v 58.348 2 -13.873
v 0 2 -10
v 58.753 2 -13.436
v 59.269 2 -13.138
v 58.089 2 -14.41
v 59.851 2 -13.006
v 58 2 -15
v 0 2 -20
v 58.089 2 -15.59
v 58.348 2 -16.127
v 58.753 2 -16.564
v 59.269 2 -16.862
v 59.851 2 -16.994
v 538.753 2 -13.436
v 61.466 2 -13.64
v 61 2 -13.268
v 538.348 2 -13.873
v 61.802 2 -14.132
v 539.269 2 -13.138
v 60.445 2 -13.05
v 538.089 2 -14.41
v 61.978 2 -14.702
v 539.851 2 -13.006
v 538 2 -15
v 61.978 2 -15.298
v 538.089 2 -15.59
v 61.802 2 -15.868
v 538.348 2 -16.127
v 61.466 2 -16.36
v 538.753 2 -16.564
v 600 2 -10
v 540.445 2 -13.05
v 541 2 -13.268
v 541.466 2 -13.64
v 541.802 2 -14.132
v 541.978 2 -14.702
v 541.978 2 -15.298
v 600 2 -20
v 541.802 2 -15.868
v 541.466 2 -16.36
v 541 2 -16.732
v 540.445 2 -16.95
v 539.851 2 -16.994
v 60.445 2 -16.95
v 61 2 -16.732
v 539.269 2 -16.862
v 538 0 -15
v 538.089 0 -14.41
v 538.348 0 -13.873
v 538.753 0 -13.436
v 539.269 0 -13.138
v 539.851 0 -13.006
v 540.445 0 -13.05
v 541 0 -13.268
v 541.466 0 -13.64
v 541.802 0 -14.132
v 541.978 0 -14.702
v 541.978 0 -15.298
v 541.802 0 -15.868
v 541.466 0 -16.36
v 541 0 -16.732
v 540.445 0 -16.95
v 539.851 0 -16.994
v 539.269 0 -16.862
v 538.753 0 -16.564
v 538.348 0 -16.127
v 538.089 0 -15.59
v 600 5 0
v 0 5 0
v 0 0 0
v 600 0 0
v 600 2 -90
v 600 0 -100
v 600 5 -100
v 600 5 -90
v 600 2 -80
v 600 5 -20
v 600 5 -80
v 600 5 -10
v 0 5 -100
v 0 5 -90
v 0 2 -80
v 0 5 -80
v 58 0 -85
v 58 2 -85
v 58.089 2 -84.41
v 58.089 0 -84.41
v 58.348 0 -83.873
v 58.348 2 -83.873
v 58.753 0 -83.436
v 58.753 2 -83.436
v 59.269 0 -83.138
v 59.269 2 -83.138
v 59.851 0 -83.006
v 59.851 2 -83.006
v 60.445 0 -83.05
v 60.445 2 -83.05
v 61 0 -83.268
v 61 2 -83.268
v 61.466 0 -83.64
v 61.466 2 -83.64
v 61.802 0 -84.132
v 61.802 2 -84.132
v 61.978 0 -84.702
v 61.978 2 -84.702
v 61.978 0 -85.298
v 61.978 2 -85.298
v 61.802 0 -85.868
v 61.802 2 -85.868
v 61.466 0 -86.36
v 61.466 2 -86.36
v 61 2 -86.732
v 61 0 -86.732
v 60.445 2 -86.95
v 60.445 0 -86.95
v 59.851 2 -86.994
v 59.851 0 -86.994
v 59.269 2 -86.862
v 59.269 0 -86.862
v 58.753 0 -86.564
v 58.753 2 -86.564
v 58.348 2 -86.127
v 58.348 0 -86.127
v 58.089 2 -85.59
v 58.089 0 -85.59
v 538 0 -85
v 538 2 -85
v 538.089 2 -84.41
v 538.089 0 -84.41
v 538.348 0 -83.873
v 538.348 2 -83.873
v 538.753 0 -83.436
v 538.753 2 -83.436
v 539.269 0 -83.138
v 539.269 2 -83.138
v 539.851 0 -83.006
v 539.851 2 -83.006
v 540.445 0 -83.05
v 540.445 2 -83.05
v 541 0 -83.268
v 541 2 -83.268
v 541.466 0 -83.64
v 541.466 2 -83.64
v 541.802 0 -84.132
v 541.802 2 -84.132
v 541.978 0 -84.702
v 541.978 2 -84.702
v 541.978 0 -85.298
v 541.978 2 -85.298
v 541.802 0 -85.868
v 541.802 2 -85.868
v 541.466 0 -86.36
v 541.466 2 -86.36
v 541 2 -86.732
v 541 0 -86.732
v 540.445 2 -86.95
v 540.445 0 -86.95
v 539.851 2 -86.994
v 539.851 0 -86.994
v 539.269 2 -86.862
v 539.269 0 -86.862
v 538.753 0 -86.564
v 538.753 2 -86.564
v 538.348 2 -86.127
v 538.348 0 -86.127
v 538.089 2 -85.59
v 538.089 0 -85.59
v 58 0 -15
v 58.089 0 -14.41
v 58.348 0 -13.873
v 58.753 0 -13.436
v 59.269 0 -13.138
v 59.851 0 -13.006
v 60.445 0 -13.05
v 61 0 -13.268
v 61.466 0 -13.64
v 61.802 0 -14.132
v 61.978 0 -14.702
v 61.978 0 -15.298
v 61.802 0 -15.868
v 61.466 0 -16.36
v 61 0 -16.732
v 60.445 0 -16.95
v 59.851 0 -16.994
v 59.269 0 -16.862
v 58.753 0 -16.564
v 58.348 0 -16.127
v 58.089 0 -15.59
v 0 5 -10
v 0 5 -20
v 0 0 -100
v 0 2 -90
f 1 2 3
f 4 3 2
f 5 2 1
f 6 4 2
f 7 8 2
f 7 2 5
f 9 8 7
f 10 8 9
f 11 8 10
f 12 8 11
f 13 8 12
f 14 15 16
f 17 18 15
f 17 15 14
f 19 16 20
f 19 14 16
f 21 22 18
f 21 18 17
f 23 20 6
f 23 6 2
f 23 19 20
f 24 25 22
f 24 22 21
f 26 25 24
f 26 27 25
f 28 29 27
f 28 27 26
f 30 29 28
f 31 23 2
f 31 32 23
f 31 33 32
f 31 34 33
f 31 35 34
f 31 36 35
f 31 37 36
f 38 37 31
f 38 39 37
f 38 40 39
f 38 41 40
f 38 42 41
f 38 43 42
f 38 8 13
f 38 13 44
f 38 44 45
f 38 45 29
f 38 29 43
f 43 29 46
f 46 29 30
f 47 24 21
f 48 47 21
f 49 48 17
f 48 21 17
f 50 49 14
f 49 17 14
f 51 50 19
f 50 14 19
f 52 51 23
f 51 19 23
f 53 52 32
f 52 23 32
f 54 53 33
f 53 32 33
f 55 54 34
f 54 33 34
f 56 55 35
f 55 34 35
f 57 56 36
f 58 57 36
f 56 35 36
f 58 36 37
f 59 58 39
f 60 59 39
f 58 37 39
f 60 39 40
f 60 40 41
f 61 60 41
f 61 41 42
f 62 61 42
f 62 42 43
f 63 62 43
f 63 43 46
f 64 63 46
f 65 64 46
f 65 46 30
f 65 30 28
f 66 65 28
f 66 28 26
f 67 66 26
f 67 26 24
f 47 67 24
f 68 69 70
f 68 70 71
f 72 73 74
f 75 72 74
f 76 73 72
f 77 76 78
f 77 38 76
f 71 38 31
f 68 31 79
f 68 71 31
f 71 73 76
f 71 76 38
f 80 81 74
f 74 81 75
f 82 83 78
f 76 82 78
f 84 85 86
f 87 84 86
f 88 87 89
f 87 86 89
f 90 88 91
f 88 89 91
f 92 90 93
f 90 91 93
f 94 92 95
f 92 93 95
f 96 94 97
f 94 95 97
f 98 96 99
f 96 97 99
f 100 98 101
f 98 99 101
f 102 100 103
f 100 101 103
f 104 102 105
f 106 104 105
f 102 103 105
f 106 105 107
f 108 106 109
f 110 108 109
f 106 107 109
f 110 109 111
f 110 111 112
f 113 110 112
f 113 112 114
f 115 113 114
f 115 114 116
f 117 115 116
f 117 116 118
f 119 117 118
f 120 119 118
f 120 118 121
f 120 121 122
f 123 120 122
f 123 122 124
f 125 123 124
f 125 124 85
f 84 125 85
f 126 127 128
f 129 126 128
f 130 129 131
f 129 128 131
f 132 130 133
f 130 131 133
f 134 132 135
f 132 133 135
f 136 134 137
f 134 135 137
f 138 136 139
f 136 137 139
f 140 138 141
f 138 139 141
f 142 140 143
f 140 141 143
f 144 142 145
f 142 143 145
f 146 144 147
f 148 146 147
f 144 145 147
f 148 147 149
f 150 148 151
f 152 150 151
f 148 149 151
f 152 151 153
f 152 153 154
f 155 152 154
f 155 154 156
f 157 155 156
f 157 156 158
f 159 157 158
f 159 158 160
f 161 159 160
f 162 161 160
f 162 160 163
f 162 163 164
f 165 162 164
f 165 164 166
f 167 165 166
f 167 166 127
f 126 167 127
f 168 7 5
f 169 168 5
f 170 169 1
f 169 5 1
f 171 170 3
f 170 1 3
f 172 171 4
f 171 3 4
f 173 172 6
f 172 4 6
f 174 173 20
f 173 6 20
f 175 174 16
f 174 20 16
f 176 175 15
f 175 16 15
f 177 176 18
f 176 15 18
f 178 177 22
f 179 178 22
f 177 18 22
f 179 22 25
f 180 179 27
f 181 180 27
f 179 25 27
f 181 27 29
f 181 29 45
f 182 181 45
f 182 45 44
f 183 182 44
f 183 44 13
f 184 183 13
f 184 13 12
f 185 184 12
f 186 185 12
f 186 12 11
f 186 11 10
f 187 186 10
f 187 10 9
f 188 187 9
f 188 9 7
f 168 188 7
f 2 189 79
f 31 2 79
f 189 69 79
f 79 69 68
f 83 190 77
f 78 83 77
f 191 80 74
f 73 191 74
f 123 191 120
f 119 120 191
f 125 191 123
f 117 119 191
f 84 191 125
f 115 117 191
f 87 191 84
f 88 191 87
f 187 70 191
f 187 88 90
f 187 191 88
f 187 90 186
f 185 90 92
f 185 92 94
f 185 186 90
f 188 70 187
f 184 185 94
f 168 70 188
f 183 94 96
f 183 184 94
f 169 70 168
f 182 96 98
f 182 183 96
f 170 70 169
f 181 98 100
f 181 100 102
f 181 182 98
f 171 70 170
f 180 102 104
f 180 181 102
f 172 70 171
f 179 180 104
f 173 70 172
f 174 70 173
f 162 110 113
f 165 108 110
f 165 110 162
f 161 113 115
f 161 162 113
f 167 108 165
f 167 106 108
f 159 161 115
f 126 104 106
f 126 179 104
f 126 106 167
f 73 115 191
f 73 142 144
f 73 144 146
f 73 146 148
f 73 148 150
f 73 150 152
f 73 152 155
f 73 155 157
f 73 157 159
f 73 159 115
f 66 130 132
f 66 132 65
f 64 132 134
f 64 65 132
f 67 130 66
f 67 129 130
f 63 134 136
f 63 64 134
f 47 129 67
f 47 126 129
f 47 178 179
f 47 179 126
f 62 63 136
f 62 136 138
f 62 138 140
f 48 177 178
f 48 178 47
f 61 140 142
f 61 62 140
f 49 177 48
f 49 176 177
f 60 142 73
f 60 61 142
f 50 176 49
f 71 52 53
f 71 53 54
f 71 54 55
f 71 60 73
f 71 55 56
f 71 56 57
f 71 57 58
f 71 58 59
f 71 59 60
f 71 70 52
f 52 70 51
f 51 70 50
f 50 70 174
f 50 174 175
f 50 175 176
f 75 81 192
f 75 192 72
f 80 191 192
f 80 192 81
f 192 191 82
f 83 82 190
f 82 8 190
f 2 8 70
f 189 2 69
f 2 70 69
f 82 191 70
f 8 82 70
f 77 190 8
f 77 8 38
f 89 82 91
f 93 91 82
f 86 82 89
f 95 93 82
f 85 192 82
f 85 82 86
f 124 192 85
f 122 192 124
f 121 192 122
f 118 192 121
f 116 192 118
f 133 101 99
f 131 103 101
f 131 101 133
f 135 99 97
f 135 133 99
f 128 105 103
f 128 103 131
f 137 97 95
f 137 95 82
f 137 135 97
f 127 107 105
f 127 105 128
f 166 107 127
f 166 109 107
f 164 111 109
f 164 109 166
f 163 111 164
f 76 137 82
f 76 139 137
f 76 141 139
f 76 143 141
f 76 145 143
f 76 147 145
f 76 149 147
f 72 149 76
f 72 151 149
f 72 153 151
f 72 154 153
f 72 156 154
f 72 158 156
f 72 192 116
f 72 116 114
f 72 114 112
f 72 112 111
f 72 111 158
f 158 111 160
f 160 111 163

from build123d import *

# Parameters (mm, degrees)
SKETCH1_W           = 600
SKETCH1_H           = 5
BOSS_EXTRUDE1_DEPTH = 100
SKETCH5_W           = 600
SKETCH5_H           = 10
CUT_EXTRUDE1_DEPTH  = 3
SKETCH6_R           = 2
CUT_EXTRUDE2_DEPTH  = 609.296802556


with BuildPart() as part:
    # Sketch1 → Boss-Extrude1 (new body)
    with BuildSketch(Plane.XY):
        with Locations((300, 2.5)):
            Rectangle(SKETCH1_W, SKETCH1_H)
    extrude(amount=-BOSS_EXTRUDE1_DEPTH)

    # Sketch5 → Cut-Extrude1 (cut)
    with BuildSketch(Plane(origin=(0, 5, 0), x_dir=(1, 0, 0), z_dir=(0, 1, 0))):
        with Locations((300, 85)):
            Rectangle(SKETCH5_W, SKETCH5_H)
        with Locations((300, 15)):
            Rectangle(SKETCH5_W, SKETCH5_H)
    extrude(amount=-CUT_EXTRUDE1_DEPTH, mode=Mode.SUBTRACT)

    # Sketch6 → Cut-Extrude2 (cut, through all)
    with BuildSketch(Plane(origin=(0, 5, 0), x_dir=(1, 0, 0), z_dir=(0, 1, 0))):
        with Locations(Location((60, 85, 0), (0, 0, 180))):
            Circle(SKETCH6_R)
        with Locations(Location((60, 15, 0), (0, 0, 180))):
            Circle(SKETCH6_R)
        with Locations(Location((540, 85, 0), (0, 0, 180))):
            Circle(SKETCH6_R)
        with Locations(Location((540, 15, 0), (0, 0, 180))):
            Circle(SKETCH6_R)
    extrude(amount=-CUT_EXTRUDE2_DEPTH, mode=Mode.SUBTRACT)


solid = part.part
